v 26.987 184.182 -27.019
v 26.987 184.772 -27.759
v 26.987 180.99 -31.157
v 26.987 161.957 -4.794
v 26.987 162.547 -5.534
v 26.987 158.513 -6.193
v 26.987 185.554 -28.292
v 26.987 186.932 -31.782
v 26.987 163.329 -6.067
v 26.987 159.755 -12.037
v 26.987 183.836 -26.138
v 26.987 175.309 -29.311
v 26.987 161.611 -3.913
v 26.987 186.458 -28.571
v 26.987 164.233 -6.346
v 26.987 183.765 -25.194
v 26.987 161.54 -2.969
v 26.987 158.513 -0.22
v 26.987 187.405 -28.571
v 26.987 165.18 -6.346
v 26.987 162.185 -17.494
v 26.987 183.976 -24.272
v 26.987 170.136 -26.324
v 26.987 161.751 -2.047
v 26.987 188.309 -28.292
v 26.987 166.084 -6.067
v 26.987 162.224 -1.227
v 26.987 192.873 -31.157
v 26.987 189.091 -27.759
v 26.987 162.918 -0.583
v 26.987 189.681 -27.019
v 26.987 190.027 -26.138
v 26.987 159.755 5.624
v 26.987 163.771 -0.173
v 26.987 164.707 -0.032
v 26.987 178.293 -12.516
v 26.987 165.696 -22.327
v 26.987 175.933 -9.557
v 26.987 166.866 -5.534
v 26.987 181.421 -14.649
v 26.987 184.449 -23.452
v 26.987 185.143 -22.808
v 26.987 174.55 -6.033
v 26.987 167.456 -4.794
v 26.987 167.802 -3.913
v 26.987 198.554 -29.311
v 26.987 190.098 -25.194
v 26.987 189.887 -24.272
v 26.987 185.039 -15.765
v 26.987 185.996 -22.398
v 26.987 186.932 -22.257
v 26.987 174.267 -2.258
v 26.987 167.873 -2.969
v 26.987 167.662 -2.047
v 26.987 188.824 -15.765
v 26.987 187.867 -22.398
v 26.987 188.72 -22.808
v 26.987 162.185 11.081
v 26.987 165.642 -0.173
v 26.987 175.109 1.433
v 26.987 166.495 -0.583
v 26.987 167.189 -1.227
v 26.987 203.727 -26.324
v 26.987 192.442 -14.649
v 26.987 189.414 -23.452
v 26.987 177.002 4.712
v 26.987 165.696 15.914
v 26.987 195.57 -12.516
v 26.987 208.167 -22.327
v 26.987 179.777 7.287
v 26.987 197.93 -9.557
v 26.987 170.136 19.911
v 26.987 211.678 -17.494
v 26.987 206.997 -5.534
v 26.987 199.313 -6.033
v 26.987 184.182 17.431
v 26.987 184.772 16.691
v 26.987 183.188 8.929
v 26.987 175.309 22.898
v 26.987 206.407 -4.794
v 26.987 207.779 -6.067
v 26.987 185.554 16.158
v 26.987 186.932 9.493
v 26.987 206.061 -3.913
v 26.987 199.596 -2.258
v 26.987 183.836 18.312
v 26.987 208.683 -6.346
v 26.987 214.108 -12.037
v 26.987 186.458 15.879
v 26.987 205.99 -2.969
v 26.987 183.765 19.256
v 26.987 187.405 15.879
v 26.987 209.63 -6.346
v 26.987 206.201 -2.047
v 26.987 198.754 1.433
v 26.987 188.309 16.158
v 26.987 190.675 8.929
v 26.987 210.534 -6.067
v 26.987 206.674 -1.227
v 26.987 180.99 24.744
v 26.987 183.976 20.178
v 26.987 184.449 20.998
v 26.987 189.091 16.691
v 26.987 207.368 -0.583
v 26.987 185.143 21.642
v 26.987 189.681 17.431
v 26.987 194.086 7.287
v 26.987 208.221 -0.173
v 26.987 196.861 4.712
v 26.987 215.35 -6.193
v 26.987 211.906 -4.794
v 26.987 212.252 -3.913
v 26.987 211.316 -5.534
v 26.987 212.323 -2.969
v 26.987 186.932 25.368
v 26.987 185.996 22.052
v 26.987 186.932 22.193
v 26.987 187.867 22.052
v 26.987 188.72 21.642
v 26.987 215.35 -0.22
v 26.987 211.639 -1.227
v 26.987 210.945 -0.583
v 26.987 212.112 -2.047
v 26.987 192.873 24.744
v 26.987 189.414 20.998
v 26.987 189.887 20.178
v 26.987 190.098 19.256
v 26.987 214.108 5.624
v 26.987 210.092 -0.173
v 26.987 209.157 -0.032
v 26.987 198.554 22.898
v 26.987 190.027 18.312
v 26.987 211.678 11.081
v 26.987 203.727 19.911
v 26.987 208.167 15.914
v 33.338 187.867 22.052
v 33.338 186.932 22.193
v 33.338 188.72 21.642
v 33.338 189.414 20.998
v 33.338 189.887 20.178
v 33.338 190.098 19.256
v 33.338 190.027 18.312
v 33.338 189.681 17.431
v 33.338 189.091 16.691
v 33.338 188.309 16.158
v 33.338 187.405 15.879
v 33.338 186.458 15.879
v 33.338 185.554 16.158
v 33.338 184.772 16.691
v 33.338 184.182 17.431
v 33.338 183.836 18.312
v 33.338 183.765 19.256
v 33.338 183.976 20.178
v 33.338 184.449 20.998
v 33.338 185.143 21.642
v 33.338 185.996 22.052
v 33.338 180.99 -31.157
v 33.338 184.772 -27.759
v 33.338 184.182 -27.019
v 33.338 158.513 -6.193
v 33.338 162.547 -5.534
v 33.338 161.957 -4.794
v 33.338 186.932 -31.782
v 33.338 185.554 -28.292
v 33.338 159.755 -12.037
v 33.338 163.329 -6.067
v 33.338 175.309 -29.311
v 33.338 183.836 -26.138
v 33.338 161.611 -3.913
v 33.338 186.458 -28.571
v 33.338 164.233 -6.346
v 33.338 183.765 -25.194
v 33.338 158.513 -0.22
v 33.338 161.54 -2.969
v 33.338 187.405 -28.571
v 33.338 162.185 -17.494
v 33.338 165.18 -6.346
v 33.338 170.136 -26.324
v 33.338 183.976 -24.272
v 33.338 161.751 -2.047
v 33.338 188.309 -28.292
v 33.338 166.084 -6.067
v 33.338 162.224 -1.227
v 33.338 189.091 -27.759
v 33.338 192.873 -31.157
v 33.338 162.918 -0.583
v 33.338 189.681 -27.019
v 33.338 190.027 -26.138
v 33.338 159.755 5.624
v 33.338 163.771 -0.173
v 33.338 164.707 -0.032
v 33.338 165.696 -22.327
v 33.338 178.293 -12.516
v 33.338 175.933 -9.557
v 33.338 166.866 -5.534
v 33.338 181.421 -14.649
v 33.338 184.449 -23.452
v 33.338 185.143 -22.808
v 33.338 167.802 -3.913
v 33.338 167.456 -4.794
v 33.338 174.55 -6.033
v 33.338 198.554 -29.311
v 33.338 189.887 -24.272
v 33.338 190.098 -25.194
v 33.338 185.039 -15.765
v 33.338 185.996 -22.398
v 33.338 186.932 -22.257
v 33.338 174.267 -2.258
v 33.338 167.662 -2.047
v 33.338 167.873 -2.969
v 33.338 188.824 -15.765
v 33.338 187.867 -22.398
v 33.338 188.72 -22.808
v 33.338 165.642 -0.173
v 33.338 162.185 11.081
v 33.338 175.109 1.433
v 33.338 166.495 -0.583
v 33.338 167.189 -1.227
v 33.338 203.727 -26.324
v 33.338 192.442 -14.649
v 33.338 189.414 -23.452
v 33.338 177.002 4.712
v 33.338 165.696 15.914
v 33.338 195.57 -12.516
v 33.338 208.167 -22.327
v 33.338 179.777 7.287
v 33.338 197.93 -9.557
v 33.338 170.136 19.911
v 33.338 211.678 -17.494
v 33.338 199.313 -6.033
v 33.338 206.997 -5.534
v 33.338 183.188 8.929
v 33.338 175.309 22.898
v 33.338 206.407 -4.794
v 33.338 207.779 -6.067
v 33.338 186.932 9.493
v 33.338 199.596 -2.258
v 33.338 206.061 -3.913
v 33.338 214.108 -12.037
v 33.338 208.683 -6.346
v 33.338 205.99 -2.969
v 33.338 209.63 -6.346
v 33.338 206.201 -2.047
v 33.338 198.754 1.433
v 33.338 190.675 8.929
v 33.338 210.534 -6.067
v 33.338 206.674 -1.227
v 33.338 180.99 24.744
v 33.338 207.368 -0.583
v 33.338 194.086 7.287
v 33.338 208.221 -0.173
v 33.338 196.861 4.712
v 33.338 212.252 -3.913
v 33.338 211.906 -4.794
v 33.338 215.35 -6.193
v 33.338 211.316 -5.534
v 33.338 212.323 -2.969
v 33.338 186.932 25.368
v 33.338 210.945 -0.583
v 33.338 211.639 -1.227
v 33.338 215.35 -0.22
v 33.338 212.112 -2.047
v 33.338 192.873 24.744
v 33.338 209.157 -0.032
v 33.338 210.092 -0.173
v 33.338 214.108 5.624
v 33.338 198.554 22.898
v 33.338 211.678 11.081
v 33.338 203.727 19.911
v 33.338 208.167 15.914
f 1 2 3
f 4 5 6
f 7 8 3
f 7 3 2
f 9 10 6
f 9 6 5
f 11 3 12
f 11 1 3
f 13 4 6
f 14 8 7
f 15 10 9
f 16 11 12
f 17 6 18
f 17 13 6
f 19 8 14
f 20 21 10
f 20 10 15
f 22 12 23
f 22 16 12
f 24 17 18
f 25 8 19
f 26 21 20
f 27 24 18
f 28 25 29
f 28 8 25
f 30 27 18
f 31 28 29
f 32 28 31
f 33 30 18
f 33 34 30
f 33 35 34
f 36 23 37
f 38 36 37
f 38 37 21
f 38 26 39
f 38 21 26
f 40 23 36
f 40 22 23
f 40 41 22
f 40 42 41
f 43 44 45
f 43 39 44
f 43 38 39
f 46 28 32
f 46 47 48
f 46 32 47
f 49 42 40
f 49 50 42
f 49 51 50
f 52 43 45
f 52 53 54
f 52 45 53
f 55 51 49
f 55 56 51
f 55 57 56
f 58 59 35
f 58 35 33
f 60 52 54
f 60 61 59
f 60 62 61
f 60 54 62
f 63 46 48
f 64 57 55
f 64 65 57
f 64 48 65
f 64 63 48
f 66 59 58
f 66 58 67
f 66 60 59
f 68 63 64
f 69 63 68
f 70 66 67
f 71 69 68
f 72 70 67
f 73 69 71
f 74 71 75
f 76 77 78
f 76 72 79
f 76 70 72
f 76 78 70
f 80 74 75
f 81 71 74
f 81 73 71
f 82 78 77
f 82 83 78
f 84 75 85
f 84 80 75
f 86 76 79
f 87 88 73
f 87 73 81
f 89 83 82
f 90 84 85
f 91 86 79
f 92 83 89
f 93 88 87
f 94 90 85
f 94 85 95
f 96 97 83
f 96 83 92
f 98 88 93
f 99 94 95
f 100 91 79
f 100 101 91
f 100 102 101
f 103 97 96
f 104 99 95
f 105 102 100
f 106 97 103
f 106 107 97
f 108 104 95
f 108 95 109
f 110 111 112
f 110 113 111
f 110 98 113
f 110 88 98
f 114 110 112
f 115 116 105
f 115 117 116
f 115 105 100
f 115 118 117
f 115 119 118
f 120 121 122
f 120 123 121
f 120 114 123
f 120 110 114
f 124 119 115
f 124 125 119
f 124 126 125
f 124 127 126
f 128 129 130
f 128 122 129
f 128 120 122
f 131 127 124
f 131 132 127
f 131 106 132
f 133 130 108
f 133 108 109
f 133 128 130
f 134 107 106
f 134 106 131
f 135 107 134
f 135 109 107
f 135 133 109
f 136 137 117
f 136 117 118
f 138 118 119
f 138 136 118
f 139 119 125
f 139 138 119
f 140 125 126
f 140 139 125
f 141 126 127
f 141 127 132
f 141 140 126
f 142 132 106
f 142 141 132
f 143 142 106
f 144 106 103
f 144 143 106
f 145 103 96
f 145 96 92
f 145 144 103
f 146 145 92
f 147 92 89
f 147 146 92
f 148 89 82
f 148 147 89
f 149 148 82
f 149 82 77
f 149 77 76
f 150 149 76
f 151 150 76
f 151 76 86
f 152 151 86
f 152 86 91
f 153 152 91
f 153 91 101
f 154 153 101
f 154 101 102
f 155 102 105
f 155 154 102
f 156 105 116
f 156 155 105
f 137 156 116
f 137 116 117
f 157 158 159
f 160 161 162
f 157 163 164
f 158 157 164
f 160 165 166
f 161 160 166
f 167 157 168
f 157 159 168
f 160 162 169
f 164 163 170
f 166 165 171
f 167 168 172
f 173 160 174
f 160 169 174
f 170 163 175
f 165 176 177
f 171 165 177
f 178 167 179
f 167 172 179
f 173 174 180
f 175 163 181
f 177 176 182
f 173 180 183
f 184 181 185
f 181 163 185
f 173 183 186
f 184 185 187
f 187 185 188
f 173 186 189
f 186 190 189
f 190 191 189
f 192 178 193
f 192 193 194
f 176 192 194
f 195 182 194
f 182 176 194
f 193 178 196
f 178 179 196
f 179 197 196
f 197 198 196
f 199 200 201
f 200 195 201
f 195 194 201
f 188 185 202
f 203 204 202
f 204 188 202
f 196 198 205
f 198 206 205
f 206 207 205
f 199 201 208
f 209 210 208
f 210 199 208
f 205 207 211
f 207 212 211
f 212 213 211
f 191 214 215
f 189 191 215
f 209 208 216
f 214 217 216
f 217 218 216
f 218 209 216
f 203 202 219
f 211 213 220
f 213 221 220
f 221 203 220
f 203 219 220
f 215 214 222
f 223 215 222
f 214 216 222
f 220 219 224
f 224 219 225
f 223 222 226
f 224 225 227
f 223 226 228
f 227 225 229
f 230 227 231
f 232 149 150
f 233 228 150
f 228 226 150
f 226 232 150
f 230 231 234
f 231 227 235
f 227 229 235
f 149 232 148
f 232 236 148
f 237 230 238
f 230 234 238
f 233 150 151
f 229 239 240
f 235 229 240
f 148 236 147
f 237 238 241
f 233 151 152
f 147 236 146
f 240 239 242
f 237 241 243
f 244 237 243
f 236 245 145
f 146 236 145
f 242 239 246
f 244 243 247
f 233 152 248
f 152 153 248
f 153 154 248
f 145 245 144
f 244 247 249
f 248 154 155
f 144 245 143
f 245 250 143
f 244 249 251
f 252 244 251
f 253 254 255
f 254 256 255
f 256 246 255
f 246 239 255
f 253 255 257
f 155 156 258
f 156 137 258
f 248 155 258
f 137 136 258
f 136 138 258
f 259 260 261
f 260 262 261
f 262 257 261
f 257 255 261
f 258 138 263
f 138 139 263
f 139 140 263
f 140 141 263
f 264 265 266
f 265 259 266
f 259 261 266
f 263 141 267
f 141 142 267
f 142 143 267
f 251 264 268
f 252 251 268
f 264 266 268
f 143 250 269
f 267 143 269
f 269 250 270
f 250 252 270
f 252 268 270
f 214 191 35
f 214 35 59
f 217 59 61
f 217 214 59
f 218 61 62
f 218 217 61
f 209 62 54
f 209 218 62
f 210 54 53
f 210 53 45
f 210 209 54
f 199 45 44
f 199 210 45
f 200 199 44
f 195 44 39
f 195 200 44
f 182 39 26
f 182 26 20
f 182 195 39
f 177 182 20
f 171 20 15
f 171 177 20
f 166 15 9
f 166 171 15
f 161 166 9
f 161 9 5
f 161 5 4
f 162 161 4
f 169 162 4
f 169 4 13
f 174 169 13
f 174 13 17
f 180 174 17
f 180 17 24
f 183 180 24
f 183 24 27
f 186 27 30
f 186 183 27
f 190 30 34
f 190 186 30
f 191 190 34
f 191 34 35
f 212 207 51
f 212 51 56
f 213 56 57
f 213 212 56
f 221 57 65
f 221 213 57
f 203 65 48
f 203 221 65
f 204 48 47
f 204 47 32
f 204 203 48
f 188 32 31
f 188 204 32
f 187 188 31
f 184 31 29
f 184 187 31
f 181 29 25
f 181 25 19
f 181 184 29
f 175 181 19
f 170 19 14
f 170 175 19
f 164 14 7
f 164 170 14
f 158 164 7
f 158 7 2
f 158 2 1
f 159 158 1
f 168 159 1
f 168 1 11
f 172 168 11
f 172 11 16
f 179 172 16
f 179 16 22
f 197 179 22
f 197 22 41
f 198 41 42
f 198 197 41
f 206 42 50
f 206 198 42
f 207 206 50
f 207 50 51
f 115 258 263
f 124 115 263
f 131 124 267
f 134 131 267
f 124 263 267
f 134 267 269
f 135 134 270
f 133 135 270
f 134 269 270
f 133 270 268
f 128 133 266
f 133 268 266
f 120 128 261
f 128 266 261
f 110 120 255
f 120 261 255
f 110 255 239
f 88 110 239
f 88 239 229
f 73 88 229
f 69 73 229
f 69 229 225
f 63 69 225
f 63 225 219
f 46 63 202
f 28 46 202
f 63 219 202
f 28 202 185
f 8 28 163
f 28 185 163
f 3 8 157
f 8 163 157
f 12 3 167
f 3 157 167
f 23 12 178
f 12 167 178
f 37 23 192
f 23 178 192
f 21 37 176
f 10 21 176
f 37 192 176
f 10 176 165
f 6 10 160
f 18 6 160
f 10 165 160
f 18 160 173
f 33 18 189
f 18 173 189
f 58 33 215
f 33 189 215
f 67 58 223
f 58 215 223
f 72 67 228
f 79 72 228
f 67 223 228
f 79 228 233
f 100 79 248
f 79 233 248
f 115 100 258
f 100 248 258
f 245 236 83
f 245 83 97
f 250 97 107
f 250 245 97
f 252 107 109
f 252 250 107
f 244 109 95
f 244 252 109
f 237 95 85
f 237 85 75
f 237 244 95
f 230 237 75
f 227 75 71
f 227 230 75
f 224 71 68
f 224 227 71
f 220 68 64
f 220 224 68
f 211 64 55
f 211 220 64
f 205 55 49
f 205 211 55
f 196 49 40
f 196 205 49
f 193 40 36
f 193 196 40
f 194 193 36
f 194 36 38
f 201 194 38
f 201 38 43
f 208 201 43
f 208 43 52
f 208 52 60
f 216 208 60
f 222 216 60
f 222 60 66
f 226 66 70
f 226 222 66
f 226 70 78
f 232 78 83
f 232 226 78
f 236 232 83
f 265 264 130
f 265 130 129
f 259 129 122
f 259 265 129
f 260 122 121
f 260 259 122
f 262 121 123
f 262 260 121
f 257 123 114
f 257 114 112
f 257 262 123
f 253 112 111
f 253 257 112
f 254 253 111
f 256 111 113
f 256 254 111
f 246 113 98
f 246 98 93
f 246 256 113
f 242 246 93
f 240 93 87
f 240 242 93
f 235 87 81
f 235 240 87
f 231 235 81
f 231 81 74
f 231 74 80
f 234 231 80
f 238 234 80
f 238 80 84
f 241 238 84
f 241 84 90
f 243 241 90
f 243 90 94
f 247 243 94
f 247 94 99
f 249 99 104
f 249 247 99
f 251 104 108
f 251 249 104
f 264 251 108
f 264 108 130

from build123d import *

# Parameters (mm, degrees)
SKETCH1_R           = 28.575
SKETCH1_R_2         = 12.7
SKETCH1_R_3         = 3.175
BOSS_EXTRUDE1_DEPTH = 6.35


with BuildPart() as part:
    # Sketch1 → Boss-Extrude1 (new body)
    with BuildSketch(Plane.ZY.offset(-33.3375)):
        with Locations((-3.206573009, 186.931527045)):
            Circle(SKETCH1_R)
        with Locations((-3.206573009, 186.931527045)):
            Circle(SKETCH1_R_2, mode=Mode.SUBTRACT)
        with Locations((19.018426991, 186.931527045)):
            Circle(SKETCH1_R_3, mode=Mode.SUBTRACT)
        with Locations((-3.206573009, 164.706527045)):
            Circle(SKETCH1_R_3, mode=Mode.SUBTRACT)
        with Locations((-25.431573009, 186.931527045)):
            Circle(SKETCH1_R_3, mode=Mode.SUBTRACT)
        with Locations((-3.206573009, 209.156527045)):
            Circle(SKETCH1_R_3, mode=Mode.SUBTRACT)
    extrude(amount=BOSS_EXTRUDE1_DEPTH)


solid = part.part
